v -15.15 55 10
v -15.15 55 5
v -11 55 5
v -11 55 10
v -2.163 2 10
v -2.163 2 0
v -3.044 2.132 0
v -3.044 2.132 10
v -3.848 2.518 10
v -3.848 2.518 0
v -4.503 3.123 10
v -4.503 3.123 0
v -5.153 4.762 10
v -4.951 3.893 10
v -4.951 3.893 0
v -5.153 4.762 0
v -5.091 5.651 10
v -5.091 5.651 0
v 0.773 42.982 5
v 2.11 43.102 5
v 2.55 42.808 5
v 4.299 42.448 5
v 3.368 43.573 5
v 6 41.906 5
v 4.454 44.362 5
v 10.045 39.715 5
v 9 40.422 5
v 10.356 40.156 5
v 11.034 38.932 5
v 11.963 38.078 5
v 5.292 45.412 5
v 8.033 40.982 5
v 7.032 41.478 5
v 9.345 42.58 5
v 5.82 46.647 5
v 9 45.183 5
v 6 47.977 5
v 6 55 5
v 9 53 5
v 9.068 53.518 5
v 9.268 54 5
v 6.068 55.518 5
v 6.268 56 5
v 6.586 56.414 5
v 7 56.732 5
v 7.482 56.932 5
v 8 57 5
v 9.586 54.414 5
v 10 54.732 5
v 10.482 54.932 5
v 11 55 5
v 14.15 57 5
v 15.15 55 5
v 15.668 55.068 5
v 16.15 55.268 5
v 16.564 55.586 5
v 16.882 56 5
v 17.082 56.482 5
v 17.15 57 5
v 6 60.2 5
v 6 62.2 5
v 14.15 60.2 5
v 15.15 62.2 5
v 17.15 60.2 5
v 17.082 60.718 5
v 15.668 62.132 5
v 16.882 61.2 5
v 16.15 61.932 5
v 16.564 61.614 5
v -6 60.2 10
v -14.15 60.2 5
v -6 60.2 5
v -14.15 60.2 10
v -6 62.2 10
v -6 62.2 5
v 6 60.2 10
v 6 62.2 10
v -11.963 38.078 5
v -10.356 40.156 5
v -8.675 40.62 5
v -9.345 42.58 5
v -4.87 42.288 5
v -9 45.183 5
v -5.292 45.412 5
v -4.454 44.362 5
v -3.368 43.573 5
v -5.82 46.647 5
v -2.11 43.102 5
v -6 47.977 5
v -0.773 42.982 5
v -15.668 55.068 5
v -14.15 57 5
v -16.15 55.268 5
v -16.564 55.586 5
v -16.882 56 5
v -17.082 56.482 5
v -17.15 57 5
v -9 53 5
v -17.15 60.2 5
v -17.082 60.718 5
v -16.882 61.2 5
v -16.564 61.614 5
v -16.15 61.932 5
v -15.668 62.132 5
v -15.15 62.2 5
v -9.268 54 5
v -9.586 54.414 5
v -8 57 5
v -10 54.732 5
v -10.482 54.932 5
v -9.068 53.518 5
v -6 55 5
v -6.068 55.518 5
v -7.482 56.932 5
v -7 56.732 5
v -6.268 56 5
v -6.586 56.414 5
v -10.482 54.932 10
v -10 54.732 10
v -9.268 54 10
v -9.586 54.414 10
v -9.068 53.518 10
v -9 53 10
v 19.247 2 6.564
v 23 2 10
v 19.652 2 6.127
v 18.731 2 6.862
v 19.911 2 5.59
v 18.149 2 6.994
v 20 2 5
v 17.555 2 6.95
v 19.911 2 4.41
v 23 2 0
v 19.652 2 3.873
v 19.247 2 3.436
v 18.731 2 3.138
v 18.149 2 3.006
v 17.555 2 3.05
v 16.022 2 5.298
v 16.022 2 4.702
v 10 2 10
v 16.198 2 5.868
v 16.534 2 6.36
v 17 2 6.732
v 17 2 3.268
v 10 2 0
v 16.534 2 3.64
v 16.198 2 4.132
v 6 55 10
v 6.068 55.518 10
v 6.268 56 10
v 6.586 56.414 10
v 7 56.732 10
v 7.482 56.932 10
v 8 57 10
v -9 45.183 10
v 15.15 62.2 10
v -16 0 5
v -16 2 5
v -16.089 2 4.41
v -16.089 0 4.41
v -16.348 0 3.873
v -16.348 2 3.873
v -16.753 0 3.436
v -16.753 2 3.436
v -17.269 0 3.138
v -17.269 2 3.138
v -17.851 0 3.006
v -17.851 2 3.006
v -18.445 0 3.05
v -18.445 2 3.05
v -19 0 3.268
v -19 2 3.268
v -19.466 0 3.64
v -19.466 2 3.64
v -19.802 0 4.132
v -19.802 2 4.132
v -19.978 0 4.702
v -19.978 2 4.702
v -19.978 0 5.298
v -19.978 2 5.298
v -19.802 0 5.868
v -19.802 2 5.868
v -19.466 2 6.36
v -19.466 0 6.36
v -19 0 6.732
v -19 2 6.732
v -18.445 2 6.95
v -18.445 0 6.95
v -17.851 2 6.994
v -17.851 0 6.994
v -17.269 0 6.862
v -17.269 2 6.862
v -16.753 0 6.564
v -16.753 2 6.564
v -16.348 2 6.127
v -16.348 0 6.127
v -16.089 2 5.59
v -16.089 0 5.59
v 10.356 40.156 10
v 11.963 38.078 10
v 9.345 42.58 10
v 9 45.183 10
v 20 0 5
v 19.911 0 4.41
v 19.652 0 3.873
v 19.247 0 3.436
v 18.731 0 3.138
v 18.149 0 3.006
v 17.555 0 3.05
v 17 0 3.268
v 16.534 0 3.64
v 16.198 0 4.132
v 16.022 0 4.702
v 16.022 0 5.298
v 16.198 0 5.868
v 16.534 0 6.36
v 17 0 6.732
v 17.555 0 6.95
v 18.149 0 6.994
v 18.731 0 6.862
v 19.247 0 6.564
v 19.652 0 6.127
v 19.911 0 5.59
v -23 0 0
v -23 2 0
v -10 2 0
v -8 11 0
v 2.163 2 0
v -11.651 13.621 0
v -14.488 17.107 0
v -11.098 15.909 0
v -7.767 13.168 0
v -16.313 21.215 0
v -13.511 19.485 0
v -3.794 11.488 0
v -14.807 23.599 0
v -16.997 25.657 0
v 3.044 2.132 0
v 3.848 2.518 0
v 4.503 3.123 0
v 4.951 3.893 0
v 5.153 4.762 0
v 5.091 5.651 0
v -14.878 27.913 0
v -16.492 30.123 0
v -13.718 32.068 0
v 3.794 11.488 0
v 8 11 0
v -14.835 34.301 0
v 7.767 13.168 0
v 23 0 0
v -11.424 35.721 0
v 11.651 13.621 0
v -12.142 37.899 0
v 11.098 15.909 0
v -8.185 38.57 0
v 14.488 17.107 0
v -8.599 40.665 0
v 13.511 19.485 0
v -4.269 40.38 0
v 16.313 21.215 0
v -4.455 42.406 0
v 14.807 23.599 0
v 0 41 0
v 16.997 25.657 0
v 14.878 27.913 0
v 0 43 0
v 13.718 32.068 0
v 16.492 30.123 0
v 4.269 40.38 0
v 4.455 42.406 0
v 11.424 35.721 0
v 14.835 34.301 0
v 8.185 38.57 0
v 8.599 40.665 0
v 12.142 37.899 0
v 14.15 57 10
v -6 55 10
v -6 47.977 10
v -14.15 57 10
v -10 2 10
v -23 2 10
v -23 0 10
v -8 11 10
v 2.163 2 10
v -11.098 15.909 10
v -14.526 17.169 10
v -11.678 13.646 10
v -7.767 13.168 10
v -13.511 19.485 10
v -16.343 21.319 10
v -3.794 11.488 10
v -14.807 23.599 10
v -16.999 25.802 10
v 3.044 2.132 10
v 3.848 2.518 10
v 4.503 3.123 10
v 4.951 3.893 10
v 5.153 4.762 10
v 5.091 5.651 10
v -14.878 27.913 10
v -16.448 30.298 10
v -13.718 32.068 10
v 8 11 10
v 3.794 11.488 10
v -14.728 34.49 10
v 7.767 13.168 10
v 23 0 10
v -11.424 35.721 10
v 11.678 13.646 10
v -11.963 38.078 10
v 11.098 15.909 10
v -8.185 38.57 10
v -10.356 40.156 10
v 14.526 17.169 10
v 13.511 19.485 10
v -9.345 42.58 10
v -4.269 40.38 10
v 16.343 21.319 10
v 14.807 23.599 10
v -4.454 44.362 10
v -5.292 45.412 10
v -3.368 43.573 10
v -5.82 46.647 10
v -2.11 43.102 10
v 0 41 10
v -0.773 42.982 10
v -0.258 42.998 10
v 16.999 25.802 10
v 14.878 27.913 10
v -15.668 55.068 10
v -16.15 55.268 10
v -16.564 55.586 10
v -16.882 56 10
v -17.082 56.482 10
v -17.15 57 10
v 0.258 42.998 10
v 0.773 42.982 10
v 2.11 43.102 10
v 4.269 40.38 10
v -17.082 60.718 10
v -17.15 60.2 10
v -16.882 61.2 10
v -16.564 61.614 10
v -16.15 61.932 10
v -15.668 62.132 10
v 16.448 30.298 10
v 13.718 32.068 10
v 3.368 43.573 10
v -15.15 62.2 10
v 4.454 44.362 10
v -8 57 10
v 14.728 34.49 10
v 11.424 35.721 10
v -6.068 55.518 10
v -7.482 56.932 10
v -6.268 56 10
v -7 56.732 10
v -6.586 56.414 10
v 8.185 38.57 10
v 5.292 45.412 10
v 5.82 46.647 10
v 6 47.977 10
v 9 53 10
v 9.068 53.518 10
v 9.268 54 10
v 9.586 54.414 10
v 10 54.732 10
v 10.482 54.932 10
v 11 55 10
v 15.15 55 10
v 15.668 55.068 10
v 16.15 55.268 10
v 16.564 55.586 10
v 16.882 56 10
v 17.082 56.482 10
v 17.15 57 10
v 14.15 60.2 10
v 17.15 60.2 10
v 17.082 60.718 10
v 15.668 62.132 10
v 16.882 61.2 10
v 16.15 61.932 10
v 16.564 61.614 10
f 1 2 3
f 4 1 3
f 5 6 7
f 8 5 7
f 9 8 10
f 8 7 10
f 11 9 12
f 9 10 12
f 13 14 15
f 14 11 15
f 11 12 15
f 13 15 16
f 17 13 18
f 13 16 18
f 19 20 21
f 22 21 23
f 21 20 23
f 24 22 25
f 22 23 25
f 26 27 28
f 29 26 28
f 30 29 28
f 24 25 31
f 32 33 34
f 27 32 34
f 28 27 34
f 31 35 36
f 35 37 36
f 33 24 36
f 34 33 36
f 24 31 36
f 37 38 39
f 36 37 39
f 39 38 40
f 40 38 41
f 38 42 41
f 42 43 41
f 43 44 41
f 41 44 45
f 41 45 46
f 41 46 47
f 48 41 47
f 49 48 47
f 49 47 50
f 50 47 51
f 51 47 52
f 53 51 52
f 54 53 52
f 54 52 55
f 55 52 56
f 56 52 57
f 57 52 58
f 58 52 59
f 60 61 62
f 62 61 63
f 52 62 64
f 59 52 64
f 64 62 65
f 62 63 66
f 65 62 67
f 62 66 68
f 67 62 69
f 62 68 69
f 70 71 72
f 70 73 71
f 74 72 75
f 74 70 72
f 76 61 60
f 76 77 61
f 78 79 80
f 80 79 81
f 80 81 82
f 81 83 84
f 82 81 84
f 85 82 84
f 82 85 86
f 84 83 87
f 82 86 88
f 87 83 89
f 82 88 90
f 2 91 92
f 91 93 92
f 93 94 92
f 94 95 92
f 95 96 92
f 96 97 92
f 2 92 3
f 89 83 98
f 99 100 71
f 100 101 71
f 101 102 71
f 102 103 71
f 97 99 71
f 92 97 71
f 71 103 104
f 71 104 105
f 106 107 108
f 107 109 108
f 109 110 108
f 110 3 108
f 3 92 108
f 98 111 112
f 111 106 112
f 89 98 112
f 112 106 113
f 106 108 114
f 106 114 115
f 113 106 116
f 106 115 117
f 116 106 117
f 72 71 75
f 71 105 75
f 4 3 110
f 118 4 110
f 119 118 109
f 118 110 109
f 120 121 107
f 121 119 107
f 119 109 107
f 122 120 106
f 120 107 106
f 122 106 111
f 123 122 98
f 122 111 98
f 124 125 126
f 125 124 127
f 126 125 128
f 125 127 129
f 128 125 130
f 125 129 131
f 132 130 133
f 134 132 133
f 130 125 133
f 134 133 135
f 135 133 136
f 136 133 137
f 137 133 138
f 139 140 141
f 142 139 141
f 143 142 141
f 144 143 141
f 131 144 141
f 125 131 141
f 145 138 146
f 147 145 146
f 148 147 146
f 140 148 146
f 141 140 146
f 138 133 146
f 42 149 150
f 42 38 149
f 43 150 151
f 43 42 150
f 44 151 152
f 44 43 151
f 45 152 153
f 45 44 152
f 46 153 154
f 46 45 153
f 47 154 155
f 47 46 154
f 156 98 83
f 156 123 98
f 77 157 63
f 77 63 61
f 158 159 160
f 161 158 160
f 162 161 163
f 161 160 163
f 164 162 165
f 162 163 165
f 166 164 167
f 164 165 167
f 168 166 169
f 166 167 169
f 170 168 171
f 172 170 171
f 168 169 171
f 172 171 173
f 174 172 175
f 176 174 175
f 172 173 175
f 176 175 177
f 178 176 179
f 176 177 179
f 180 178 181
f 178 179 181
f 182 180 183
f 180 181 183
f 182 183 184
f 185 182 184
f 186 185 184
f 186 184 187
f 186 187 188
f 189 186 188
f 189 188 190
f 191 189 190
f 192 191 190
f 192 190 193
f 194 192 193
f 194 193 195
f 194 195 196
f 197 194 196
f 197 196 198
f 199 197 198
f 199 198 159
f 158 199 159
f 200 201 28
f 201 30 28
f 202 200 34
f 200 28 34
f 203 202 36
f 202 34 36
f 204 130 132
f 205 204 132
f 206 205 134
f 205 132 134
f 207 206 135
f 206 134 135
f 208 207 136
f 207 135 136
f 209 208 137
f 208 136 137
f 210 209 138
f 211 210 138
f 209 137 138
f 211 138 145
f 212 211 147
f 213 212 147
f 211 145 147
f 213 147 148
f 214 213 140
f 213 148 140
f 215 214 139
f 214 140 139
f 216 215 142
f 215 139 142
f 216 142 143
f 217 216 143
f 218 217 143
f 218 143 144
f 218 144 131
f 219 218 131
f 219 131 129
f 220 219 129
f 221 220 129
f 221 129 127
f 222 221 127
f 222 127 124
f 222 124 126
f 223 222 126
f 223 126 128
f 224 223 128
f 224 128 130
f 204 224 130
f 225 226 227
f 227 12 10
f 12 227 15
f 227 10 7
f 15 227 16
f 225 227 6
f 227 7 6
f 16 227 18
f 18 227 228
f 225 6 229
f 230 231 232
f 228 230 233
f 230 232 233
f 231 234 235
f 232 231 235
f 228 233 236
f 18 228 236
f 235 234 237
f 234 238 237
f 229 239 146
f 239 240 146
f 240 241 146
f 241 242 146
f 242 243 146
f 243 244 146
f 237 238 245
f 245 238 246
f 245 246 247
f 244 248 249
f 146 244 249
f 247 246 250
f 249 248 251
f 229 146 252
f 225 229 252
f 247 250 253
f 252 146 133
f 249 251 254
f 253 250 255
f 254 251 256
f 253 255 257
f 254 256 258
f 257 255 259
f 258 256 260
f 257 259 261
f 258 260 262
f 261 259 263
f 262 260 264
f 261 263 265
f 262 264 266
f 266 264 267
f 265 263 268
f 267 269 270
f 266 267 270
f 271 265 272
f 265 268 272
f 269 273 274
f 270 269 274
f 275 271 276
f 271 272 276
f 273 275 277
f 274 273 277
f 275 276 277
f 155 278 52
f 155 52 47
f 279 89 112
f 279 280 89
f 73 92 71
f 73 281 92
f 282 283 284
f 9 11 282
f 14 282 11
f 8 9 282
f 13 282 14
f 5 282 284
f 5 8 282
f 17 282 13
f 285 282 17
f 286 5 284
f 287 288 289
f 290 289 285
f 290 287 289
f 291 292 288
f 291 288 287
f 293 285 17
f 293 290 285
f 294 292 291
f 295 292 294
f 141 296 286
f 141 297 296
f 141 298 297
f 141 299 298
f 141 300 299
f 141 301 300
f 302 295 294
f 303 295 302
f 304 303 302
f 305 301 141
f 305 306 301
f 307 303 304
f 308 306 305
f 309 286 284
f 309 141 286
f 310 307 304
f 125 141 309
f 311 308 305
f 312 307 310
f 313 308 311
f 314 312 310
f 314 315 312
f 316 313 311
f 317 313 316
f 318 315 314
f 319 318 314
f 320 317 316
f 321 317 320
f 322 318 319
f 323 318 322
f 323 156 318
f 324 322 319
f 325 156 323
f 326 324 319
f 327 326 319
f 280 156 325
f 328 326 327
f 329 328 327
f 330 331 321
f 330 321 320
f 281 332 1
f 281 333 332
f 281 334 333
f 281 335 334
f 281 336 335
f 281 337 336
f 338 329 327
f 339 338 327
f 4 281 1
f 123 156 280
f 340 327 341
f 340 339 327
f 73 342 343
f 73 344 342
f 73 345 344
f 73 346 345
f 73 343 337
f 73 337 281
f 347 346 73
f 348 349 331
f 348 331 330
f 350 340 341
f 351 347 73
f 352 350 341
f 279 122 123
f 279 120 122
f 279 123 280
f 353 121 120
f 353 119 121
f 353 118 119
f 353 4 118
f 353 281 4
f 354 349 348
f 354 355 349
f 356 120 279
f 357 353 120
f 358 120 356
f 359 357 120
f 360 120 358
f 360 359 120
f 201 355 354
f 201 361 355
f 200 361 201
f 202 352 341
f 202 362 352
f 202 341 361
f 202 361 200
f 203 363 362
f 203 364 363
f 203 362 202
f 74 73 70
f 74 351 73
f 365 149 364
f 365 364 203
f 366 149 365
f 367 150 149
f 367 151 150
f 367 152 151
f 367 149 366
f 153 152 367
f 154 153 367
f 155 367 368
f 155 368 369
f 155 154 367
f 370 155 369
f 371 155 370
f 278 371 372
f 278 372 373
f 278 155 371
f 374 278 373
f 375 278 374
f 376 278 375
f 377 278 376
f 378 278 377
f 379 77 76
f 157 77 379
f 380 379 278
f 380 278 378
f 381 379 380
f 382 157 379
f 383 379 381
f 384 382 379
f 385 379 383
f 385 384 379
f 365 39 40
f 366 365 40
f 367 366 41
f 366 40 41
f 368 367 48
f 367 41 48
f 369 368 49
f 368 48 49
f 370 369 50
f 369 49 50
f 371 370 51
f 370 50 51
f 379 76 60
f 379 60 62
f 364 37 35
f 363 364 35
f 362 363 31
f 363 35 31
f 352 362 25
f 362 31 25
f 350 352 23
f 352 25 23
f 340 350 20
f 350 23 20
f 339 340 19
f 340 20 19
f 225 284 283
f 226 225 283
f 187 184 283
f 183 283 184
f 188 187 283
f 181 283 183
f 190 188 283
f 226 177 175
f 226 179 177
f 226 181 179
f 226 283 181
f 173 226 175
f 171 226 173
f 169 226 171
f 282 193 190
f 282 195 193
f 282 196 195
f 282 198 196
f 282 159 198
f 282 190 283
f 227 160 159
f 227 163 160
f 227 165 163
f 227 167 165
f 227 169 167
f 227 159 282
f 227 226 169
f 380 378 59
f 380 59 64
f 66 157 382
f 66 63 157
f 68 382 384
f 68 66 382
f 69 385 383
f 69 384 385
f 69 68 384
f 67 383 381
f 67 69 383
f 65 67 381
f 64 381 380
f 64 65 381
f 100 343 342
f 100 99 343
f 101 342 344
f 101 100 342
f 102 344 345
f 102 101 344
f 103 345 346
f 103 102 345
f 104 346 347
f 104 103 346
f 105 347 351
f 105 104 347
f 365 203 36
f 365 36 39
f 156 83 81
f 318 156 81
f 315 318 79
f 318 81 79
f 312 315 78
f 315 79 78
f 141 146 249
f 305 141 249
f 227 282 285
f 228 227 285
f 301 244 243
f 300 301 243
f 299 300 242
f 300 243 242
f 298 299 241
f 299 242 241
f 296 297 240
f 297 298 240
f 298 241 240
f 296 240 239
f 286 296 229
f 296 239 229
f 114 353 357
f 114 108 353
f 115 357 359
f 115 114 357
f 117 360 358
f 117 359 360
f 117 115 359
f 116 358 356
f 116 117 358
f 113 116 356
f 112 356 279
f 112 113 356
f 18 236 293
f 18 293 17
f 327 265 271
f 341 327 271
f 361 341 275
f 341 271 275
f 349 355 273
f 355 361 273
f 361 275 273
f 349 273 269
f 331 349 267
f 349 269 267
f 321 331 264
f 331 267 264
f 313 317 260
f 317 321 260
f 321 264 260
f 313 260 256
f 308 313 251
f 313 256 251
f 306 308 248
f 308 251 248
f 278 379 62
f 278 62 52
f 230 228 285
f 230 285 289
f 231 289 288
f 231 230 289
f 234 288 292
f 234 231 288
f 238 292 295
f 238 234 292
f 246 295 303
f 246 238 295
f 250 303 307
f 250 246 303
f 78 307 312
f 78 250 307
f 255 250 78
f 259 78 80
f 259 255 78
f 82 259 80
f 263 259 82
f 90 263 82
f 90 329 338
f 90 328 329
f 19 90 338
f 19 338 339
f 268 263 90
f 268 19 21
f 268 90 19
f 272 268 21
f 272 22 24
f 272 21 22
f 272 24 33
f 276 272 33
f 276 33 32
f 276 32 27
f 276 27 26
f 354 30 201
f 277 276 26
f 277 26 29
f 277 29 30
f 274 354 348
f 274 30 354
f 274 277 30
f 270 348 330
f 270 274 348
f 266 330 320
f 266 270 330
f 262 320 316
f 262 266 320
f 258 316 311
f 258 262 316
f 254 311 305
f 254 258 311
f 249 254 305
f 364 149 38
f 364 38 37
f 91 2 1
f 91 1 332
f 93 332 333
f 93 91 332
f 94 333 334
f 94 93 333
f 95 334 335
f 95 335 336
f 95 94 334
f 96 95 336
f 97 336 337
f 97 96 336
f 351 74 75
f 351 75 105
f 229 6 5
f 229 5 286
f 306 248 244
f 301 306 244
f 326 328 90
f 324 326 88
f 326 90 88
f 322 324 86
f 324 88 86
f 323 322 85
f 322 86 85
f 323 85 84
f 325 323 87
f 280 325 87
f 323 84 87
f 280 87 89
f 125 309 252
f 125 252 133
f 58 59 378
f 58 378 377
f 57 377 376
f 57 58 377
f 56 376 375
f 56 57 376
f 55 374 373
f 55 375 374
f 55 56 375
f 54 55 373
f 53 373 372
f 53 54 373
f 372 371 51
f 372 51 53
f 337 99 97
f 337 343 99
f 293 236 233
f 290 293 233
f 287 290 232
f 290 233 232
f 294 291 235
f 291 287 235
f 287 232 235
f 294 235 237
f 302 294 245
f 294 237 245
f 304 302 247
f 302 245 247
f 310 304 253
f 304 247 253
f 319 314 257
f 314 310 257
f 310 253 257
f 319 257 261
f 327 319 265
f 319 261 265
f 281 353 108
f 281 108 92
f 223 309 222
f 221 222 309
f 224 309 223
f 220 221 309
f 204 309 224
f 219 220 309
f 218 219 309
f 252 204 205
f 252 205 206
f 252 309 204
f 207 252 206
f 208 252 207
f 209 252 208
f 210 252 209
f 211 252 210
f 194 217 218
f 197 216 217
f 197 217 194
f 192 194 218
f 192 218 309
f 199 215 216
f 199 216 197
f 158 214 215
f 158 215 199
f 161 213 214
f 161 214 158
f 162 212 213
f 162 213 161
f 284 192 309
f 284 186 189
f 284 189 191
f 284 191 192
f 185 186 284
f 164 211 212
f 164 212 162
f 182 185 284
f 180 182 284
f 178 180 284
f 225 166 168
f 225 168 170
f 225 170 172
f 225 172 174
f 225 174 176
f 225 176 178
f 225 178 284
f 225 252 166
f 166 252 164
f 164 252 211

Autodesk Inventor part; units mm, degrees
ref_plane "YZ Plane" through (0, 0, 0) normal (1, 0, 0) x (0, 1, 0)
ref_plane "XZ Plane" through (0, 0, 0) normal (0, 1, 0) x (-1, 0, 0)
ref_plane "XY Plane" through (0, 0, 0) normal (0, 0, 1) x (1, 0, 0)
sketch "Sketch1" plane through (0, 0, 0) normal (0, 0, 1) x (1, 0, 0)
  line L0 (0, 0) -> (23, 0)
  line L1 (23, 0) -> (23, 2)
  line L2 (23, 2) -> (10, 2)
  line L3 (10, 2) -> (8, 11)
  line L4 (0, 0) -> (0, 26) construction
  arc A0 (8, 11) -> (0, 43) centre (0, 26) ccw
  line L5 (18, 2) -> (18, 0) construction
  arc A1 (3.794, 11.4878) -> (0, 41) centre (0, 26) ccw
  line L6 (3.794, 11.4878) -> (5.0911, 5.6508)
  arc A2 (2.1626, 2) -> (5.0911, 5.6508) centre (2.1626, 5) ccw
  line L7 (2.1626, 2) -> (0, 2)
  line L8 (0, 0) -> (-23, 0)
  line L9 (-23, 0) -> (-23, 2)
  line L10 (-23, 2) -> (-10, 2)
  line L11 (-10, 2) -> (-8, 11)
  arc A3 (0, 43) -> (-8, 11) centre (0, 26) ccw
  arc A4 (0, 41) -> (-3.794, 11.4878) centre (0, 26) ccw
  line L12 (-3.794, 11.4878) -> (-5.0911, 5.6508)
  arc A5 (-5.0911, 5.6508) -> (-2.1626, 2) centre (-2.1626, 5) ccw
  line L13 (-2.1626, 2) -> (0, 2)
  dimension "d0" = 26
  dimension "d1" = 2
  dimension "d2" = 18
  dimension "d3" = 23
  dimension "d4" = 8
  dimension "d6" = 8
  dimension "d7" = 2
  dimension "d8" = 15
  dimension "d9" = 3
  dimension "d10" = 4
extrude "Extrusion1" add sketch "Sketch1" along normal blind 10
sketch "Sketch2" plane through (10, 2, 0) normal (0, 1, 0) x (1, 0, 0)
  line L0 (13, 0) -> (0, 0) projected
  line L1 (0, 0) -> (0, -10) projected
  line L2 (13, -10) -> (0, -10) projected
  line L3 (13, 0) -> (13, -10) projected
  line L4 (-20, 0) -> (-33, 0) projected
  line L5 (-33, 0) -> (-33, -10) projected
  line L6 (-20, -10) -> (-33, -10) projected
  line L7 (-20, 0) -> (-20, -10) projected
  circle A0 centre (-28, -5) radius 2
  circle A1 centre (8, -5) radius 2
  line L8 (-28, -5) -> (8, -5) construction
  point P0 (-10, 0)
  point P1 (-10, -5)
  point P2 (13, -5)
  point P3 (-33, -5)
  dimension "d13" = 36
  dimension "d14" = 4
  dimension "d15" = 4
extrude "Extrusion2" cut sketch "Sketch2" against normal up to next contours A0 | A1
sketch "Sketch3" plane through (0, 0, 10) normal (0, 0, 1) x (1, 0, 0)
  arc A0 (8, 11) -> (-8, 11) centre (0, 26) ccw projected
  line L0 (-6, 41.906) -> (-6, 57)
  line L1 (-6, 57) -> (-14.15, 57)
  line L2 (-14.15, 57) -> (-14.15, 60.2)
  line L3 (-14.15, 60.2) -> (-6, 60.2)
  line L4 (-6, 60.2) -> (-6, 62.2)
  line L5 (-6, 62.2) -> (-17.15, 62.2)
  line L6 (-17.15, 62.2) -> (-17.15, 55)
  line L7 (-17.15, 55) -> (-9, 55)
  line L8 (-9, 55) -> (-9, 40.4222)
  line L9 (0, 43) -> (0, 63.4755) construction
  point P0 (0, 0)
  dimension "d18" = 3.2
  dimension "d19" = 14.15
  dimension "d20" = 3
  dimension "d21" = 2
  dimension "d22" = 2
  dimension "d23" = 3
  dimension "d24" = 6
  dimension "d25" = 31
extrude "Extrusion3" add sketch "Sketch3" against normal blind 5
fillet "Fillet1" radius 2 4 edges at (-9, 55, 7.5) (-17.15, 55, 7.5) (-17.15, 62.2, 7.5) (-6, 57, 7.5)
fillet "Fillet1" radius 5 1 edges at (-6, 41.906, 7.5)
fillet "Fillet1" radius 10 1 edges at (-9, 40.4222, 7.5)
mirror "Mirror1" about plane through (0, 0, 0) normal (1, 0, 0) of "Extrusion3", "Fillet1"
properties part number "DefaultMotorMount" material "ABS Plastic"
